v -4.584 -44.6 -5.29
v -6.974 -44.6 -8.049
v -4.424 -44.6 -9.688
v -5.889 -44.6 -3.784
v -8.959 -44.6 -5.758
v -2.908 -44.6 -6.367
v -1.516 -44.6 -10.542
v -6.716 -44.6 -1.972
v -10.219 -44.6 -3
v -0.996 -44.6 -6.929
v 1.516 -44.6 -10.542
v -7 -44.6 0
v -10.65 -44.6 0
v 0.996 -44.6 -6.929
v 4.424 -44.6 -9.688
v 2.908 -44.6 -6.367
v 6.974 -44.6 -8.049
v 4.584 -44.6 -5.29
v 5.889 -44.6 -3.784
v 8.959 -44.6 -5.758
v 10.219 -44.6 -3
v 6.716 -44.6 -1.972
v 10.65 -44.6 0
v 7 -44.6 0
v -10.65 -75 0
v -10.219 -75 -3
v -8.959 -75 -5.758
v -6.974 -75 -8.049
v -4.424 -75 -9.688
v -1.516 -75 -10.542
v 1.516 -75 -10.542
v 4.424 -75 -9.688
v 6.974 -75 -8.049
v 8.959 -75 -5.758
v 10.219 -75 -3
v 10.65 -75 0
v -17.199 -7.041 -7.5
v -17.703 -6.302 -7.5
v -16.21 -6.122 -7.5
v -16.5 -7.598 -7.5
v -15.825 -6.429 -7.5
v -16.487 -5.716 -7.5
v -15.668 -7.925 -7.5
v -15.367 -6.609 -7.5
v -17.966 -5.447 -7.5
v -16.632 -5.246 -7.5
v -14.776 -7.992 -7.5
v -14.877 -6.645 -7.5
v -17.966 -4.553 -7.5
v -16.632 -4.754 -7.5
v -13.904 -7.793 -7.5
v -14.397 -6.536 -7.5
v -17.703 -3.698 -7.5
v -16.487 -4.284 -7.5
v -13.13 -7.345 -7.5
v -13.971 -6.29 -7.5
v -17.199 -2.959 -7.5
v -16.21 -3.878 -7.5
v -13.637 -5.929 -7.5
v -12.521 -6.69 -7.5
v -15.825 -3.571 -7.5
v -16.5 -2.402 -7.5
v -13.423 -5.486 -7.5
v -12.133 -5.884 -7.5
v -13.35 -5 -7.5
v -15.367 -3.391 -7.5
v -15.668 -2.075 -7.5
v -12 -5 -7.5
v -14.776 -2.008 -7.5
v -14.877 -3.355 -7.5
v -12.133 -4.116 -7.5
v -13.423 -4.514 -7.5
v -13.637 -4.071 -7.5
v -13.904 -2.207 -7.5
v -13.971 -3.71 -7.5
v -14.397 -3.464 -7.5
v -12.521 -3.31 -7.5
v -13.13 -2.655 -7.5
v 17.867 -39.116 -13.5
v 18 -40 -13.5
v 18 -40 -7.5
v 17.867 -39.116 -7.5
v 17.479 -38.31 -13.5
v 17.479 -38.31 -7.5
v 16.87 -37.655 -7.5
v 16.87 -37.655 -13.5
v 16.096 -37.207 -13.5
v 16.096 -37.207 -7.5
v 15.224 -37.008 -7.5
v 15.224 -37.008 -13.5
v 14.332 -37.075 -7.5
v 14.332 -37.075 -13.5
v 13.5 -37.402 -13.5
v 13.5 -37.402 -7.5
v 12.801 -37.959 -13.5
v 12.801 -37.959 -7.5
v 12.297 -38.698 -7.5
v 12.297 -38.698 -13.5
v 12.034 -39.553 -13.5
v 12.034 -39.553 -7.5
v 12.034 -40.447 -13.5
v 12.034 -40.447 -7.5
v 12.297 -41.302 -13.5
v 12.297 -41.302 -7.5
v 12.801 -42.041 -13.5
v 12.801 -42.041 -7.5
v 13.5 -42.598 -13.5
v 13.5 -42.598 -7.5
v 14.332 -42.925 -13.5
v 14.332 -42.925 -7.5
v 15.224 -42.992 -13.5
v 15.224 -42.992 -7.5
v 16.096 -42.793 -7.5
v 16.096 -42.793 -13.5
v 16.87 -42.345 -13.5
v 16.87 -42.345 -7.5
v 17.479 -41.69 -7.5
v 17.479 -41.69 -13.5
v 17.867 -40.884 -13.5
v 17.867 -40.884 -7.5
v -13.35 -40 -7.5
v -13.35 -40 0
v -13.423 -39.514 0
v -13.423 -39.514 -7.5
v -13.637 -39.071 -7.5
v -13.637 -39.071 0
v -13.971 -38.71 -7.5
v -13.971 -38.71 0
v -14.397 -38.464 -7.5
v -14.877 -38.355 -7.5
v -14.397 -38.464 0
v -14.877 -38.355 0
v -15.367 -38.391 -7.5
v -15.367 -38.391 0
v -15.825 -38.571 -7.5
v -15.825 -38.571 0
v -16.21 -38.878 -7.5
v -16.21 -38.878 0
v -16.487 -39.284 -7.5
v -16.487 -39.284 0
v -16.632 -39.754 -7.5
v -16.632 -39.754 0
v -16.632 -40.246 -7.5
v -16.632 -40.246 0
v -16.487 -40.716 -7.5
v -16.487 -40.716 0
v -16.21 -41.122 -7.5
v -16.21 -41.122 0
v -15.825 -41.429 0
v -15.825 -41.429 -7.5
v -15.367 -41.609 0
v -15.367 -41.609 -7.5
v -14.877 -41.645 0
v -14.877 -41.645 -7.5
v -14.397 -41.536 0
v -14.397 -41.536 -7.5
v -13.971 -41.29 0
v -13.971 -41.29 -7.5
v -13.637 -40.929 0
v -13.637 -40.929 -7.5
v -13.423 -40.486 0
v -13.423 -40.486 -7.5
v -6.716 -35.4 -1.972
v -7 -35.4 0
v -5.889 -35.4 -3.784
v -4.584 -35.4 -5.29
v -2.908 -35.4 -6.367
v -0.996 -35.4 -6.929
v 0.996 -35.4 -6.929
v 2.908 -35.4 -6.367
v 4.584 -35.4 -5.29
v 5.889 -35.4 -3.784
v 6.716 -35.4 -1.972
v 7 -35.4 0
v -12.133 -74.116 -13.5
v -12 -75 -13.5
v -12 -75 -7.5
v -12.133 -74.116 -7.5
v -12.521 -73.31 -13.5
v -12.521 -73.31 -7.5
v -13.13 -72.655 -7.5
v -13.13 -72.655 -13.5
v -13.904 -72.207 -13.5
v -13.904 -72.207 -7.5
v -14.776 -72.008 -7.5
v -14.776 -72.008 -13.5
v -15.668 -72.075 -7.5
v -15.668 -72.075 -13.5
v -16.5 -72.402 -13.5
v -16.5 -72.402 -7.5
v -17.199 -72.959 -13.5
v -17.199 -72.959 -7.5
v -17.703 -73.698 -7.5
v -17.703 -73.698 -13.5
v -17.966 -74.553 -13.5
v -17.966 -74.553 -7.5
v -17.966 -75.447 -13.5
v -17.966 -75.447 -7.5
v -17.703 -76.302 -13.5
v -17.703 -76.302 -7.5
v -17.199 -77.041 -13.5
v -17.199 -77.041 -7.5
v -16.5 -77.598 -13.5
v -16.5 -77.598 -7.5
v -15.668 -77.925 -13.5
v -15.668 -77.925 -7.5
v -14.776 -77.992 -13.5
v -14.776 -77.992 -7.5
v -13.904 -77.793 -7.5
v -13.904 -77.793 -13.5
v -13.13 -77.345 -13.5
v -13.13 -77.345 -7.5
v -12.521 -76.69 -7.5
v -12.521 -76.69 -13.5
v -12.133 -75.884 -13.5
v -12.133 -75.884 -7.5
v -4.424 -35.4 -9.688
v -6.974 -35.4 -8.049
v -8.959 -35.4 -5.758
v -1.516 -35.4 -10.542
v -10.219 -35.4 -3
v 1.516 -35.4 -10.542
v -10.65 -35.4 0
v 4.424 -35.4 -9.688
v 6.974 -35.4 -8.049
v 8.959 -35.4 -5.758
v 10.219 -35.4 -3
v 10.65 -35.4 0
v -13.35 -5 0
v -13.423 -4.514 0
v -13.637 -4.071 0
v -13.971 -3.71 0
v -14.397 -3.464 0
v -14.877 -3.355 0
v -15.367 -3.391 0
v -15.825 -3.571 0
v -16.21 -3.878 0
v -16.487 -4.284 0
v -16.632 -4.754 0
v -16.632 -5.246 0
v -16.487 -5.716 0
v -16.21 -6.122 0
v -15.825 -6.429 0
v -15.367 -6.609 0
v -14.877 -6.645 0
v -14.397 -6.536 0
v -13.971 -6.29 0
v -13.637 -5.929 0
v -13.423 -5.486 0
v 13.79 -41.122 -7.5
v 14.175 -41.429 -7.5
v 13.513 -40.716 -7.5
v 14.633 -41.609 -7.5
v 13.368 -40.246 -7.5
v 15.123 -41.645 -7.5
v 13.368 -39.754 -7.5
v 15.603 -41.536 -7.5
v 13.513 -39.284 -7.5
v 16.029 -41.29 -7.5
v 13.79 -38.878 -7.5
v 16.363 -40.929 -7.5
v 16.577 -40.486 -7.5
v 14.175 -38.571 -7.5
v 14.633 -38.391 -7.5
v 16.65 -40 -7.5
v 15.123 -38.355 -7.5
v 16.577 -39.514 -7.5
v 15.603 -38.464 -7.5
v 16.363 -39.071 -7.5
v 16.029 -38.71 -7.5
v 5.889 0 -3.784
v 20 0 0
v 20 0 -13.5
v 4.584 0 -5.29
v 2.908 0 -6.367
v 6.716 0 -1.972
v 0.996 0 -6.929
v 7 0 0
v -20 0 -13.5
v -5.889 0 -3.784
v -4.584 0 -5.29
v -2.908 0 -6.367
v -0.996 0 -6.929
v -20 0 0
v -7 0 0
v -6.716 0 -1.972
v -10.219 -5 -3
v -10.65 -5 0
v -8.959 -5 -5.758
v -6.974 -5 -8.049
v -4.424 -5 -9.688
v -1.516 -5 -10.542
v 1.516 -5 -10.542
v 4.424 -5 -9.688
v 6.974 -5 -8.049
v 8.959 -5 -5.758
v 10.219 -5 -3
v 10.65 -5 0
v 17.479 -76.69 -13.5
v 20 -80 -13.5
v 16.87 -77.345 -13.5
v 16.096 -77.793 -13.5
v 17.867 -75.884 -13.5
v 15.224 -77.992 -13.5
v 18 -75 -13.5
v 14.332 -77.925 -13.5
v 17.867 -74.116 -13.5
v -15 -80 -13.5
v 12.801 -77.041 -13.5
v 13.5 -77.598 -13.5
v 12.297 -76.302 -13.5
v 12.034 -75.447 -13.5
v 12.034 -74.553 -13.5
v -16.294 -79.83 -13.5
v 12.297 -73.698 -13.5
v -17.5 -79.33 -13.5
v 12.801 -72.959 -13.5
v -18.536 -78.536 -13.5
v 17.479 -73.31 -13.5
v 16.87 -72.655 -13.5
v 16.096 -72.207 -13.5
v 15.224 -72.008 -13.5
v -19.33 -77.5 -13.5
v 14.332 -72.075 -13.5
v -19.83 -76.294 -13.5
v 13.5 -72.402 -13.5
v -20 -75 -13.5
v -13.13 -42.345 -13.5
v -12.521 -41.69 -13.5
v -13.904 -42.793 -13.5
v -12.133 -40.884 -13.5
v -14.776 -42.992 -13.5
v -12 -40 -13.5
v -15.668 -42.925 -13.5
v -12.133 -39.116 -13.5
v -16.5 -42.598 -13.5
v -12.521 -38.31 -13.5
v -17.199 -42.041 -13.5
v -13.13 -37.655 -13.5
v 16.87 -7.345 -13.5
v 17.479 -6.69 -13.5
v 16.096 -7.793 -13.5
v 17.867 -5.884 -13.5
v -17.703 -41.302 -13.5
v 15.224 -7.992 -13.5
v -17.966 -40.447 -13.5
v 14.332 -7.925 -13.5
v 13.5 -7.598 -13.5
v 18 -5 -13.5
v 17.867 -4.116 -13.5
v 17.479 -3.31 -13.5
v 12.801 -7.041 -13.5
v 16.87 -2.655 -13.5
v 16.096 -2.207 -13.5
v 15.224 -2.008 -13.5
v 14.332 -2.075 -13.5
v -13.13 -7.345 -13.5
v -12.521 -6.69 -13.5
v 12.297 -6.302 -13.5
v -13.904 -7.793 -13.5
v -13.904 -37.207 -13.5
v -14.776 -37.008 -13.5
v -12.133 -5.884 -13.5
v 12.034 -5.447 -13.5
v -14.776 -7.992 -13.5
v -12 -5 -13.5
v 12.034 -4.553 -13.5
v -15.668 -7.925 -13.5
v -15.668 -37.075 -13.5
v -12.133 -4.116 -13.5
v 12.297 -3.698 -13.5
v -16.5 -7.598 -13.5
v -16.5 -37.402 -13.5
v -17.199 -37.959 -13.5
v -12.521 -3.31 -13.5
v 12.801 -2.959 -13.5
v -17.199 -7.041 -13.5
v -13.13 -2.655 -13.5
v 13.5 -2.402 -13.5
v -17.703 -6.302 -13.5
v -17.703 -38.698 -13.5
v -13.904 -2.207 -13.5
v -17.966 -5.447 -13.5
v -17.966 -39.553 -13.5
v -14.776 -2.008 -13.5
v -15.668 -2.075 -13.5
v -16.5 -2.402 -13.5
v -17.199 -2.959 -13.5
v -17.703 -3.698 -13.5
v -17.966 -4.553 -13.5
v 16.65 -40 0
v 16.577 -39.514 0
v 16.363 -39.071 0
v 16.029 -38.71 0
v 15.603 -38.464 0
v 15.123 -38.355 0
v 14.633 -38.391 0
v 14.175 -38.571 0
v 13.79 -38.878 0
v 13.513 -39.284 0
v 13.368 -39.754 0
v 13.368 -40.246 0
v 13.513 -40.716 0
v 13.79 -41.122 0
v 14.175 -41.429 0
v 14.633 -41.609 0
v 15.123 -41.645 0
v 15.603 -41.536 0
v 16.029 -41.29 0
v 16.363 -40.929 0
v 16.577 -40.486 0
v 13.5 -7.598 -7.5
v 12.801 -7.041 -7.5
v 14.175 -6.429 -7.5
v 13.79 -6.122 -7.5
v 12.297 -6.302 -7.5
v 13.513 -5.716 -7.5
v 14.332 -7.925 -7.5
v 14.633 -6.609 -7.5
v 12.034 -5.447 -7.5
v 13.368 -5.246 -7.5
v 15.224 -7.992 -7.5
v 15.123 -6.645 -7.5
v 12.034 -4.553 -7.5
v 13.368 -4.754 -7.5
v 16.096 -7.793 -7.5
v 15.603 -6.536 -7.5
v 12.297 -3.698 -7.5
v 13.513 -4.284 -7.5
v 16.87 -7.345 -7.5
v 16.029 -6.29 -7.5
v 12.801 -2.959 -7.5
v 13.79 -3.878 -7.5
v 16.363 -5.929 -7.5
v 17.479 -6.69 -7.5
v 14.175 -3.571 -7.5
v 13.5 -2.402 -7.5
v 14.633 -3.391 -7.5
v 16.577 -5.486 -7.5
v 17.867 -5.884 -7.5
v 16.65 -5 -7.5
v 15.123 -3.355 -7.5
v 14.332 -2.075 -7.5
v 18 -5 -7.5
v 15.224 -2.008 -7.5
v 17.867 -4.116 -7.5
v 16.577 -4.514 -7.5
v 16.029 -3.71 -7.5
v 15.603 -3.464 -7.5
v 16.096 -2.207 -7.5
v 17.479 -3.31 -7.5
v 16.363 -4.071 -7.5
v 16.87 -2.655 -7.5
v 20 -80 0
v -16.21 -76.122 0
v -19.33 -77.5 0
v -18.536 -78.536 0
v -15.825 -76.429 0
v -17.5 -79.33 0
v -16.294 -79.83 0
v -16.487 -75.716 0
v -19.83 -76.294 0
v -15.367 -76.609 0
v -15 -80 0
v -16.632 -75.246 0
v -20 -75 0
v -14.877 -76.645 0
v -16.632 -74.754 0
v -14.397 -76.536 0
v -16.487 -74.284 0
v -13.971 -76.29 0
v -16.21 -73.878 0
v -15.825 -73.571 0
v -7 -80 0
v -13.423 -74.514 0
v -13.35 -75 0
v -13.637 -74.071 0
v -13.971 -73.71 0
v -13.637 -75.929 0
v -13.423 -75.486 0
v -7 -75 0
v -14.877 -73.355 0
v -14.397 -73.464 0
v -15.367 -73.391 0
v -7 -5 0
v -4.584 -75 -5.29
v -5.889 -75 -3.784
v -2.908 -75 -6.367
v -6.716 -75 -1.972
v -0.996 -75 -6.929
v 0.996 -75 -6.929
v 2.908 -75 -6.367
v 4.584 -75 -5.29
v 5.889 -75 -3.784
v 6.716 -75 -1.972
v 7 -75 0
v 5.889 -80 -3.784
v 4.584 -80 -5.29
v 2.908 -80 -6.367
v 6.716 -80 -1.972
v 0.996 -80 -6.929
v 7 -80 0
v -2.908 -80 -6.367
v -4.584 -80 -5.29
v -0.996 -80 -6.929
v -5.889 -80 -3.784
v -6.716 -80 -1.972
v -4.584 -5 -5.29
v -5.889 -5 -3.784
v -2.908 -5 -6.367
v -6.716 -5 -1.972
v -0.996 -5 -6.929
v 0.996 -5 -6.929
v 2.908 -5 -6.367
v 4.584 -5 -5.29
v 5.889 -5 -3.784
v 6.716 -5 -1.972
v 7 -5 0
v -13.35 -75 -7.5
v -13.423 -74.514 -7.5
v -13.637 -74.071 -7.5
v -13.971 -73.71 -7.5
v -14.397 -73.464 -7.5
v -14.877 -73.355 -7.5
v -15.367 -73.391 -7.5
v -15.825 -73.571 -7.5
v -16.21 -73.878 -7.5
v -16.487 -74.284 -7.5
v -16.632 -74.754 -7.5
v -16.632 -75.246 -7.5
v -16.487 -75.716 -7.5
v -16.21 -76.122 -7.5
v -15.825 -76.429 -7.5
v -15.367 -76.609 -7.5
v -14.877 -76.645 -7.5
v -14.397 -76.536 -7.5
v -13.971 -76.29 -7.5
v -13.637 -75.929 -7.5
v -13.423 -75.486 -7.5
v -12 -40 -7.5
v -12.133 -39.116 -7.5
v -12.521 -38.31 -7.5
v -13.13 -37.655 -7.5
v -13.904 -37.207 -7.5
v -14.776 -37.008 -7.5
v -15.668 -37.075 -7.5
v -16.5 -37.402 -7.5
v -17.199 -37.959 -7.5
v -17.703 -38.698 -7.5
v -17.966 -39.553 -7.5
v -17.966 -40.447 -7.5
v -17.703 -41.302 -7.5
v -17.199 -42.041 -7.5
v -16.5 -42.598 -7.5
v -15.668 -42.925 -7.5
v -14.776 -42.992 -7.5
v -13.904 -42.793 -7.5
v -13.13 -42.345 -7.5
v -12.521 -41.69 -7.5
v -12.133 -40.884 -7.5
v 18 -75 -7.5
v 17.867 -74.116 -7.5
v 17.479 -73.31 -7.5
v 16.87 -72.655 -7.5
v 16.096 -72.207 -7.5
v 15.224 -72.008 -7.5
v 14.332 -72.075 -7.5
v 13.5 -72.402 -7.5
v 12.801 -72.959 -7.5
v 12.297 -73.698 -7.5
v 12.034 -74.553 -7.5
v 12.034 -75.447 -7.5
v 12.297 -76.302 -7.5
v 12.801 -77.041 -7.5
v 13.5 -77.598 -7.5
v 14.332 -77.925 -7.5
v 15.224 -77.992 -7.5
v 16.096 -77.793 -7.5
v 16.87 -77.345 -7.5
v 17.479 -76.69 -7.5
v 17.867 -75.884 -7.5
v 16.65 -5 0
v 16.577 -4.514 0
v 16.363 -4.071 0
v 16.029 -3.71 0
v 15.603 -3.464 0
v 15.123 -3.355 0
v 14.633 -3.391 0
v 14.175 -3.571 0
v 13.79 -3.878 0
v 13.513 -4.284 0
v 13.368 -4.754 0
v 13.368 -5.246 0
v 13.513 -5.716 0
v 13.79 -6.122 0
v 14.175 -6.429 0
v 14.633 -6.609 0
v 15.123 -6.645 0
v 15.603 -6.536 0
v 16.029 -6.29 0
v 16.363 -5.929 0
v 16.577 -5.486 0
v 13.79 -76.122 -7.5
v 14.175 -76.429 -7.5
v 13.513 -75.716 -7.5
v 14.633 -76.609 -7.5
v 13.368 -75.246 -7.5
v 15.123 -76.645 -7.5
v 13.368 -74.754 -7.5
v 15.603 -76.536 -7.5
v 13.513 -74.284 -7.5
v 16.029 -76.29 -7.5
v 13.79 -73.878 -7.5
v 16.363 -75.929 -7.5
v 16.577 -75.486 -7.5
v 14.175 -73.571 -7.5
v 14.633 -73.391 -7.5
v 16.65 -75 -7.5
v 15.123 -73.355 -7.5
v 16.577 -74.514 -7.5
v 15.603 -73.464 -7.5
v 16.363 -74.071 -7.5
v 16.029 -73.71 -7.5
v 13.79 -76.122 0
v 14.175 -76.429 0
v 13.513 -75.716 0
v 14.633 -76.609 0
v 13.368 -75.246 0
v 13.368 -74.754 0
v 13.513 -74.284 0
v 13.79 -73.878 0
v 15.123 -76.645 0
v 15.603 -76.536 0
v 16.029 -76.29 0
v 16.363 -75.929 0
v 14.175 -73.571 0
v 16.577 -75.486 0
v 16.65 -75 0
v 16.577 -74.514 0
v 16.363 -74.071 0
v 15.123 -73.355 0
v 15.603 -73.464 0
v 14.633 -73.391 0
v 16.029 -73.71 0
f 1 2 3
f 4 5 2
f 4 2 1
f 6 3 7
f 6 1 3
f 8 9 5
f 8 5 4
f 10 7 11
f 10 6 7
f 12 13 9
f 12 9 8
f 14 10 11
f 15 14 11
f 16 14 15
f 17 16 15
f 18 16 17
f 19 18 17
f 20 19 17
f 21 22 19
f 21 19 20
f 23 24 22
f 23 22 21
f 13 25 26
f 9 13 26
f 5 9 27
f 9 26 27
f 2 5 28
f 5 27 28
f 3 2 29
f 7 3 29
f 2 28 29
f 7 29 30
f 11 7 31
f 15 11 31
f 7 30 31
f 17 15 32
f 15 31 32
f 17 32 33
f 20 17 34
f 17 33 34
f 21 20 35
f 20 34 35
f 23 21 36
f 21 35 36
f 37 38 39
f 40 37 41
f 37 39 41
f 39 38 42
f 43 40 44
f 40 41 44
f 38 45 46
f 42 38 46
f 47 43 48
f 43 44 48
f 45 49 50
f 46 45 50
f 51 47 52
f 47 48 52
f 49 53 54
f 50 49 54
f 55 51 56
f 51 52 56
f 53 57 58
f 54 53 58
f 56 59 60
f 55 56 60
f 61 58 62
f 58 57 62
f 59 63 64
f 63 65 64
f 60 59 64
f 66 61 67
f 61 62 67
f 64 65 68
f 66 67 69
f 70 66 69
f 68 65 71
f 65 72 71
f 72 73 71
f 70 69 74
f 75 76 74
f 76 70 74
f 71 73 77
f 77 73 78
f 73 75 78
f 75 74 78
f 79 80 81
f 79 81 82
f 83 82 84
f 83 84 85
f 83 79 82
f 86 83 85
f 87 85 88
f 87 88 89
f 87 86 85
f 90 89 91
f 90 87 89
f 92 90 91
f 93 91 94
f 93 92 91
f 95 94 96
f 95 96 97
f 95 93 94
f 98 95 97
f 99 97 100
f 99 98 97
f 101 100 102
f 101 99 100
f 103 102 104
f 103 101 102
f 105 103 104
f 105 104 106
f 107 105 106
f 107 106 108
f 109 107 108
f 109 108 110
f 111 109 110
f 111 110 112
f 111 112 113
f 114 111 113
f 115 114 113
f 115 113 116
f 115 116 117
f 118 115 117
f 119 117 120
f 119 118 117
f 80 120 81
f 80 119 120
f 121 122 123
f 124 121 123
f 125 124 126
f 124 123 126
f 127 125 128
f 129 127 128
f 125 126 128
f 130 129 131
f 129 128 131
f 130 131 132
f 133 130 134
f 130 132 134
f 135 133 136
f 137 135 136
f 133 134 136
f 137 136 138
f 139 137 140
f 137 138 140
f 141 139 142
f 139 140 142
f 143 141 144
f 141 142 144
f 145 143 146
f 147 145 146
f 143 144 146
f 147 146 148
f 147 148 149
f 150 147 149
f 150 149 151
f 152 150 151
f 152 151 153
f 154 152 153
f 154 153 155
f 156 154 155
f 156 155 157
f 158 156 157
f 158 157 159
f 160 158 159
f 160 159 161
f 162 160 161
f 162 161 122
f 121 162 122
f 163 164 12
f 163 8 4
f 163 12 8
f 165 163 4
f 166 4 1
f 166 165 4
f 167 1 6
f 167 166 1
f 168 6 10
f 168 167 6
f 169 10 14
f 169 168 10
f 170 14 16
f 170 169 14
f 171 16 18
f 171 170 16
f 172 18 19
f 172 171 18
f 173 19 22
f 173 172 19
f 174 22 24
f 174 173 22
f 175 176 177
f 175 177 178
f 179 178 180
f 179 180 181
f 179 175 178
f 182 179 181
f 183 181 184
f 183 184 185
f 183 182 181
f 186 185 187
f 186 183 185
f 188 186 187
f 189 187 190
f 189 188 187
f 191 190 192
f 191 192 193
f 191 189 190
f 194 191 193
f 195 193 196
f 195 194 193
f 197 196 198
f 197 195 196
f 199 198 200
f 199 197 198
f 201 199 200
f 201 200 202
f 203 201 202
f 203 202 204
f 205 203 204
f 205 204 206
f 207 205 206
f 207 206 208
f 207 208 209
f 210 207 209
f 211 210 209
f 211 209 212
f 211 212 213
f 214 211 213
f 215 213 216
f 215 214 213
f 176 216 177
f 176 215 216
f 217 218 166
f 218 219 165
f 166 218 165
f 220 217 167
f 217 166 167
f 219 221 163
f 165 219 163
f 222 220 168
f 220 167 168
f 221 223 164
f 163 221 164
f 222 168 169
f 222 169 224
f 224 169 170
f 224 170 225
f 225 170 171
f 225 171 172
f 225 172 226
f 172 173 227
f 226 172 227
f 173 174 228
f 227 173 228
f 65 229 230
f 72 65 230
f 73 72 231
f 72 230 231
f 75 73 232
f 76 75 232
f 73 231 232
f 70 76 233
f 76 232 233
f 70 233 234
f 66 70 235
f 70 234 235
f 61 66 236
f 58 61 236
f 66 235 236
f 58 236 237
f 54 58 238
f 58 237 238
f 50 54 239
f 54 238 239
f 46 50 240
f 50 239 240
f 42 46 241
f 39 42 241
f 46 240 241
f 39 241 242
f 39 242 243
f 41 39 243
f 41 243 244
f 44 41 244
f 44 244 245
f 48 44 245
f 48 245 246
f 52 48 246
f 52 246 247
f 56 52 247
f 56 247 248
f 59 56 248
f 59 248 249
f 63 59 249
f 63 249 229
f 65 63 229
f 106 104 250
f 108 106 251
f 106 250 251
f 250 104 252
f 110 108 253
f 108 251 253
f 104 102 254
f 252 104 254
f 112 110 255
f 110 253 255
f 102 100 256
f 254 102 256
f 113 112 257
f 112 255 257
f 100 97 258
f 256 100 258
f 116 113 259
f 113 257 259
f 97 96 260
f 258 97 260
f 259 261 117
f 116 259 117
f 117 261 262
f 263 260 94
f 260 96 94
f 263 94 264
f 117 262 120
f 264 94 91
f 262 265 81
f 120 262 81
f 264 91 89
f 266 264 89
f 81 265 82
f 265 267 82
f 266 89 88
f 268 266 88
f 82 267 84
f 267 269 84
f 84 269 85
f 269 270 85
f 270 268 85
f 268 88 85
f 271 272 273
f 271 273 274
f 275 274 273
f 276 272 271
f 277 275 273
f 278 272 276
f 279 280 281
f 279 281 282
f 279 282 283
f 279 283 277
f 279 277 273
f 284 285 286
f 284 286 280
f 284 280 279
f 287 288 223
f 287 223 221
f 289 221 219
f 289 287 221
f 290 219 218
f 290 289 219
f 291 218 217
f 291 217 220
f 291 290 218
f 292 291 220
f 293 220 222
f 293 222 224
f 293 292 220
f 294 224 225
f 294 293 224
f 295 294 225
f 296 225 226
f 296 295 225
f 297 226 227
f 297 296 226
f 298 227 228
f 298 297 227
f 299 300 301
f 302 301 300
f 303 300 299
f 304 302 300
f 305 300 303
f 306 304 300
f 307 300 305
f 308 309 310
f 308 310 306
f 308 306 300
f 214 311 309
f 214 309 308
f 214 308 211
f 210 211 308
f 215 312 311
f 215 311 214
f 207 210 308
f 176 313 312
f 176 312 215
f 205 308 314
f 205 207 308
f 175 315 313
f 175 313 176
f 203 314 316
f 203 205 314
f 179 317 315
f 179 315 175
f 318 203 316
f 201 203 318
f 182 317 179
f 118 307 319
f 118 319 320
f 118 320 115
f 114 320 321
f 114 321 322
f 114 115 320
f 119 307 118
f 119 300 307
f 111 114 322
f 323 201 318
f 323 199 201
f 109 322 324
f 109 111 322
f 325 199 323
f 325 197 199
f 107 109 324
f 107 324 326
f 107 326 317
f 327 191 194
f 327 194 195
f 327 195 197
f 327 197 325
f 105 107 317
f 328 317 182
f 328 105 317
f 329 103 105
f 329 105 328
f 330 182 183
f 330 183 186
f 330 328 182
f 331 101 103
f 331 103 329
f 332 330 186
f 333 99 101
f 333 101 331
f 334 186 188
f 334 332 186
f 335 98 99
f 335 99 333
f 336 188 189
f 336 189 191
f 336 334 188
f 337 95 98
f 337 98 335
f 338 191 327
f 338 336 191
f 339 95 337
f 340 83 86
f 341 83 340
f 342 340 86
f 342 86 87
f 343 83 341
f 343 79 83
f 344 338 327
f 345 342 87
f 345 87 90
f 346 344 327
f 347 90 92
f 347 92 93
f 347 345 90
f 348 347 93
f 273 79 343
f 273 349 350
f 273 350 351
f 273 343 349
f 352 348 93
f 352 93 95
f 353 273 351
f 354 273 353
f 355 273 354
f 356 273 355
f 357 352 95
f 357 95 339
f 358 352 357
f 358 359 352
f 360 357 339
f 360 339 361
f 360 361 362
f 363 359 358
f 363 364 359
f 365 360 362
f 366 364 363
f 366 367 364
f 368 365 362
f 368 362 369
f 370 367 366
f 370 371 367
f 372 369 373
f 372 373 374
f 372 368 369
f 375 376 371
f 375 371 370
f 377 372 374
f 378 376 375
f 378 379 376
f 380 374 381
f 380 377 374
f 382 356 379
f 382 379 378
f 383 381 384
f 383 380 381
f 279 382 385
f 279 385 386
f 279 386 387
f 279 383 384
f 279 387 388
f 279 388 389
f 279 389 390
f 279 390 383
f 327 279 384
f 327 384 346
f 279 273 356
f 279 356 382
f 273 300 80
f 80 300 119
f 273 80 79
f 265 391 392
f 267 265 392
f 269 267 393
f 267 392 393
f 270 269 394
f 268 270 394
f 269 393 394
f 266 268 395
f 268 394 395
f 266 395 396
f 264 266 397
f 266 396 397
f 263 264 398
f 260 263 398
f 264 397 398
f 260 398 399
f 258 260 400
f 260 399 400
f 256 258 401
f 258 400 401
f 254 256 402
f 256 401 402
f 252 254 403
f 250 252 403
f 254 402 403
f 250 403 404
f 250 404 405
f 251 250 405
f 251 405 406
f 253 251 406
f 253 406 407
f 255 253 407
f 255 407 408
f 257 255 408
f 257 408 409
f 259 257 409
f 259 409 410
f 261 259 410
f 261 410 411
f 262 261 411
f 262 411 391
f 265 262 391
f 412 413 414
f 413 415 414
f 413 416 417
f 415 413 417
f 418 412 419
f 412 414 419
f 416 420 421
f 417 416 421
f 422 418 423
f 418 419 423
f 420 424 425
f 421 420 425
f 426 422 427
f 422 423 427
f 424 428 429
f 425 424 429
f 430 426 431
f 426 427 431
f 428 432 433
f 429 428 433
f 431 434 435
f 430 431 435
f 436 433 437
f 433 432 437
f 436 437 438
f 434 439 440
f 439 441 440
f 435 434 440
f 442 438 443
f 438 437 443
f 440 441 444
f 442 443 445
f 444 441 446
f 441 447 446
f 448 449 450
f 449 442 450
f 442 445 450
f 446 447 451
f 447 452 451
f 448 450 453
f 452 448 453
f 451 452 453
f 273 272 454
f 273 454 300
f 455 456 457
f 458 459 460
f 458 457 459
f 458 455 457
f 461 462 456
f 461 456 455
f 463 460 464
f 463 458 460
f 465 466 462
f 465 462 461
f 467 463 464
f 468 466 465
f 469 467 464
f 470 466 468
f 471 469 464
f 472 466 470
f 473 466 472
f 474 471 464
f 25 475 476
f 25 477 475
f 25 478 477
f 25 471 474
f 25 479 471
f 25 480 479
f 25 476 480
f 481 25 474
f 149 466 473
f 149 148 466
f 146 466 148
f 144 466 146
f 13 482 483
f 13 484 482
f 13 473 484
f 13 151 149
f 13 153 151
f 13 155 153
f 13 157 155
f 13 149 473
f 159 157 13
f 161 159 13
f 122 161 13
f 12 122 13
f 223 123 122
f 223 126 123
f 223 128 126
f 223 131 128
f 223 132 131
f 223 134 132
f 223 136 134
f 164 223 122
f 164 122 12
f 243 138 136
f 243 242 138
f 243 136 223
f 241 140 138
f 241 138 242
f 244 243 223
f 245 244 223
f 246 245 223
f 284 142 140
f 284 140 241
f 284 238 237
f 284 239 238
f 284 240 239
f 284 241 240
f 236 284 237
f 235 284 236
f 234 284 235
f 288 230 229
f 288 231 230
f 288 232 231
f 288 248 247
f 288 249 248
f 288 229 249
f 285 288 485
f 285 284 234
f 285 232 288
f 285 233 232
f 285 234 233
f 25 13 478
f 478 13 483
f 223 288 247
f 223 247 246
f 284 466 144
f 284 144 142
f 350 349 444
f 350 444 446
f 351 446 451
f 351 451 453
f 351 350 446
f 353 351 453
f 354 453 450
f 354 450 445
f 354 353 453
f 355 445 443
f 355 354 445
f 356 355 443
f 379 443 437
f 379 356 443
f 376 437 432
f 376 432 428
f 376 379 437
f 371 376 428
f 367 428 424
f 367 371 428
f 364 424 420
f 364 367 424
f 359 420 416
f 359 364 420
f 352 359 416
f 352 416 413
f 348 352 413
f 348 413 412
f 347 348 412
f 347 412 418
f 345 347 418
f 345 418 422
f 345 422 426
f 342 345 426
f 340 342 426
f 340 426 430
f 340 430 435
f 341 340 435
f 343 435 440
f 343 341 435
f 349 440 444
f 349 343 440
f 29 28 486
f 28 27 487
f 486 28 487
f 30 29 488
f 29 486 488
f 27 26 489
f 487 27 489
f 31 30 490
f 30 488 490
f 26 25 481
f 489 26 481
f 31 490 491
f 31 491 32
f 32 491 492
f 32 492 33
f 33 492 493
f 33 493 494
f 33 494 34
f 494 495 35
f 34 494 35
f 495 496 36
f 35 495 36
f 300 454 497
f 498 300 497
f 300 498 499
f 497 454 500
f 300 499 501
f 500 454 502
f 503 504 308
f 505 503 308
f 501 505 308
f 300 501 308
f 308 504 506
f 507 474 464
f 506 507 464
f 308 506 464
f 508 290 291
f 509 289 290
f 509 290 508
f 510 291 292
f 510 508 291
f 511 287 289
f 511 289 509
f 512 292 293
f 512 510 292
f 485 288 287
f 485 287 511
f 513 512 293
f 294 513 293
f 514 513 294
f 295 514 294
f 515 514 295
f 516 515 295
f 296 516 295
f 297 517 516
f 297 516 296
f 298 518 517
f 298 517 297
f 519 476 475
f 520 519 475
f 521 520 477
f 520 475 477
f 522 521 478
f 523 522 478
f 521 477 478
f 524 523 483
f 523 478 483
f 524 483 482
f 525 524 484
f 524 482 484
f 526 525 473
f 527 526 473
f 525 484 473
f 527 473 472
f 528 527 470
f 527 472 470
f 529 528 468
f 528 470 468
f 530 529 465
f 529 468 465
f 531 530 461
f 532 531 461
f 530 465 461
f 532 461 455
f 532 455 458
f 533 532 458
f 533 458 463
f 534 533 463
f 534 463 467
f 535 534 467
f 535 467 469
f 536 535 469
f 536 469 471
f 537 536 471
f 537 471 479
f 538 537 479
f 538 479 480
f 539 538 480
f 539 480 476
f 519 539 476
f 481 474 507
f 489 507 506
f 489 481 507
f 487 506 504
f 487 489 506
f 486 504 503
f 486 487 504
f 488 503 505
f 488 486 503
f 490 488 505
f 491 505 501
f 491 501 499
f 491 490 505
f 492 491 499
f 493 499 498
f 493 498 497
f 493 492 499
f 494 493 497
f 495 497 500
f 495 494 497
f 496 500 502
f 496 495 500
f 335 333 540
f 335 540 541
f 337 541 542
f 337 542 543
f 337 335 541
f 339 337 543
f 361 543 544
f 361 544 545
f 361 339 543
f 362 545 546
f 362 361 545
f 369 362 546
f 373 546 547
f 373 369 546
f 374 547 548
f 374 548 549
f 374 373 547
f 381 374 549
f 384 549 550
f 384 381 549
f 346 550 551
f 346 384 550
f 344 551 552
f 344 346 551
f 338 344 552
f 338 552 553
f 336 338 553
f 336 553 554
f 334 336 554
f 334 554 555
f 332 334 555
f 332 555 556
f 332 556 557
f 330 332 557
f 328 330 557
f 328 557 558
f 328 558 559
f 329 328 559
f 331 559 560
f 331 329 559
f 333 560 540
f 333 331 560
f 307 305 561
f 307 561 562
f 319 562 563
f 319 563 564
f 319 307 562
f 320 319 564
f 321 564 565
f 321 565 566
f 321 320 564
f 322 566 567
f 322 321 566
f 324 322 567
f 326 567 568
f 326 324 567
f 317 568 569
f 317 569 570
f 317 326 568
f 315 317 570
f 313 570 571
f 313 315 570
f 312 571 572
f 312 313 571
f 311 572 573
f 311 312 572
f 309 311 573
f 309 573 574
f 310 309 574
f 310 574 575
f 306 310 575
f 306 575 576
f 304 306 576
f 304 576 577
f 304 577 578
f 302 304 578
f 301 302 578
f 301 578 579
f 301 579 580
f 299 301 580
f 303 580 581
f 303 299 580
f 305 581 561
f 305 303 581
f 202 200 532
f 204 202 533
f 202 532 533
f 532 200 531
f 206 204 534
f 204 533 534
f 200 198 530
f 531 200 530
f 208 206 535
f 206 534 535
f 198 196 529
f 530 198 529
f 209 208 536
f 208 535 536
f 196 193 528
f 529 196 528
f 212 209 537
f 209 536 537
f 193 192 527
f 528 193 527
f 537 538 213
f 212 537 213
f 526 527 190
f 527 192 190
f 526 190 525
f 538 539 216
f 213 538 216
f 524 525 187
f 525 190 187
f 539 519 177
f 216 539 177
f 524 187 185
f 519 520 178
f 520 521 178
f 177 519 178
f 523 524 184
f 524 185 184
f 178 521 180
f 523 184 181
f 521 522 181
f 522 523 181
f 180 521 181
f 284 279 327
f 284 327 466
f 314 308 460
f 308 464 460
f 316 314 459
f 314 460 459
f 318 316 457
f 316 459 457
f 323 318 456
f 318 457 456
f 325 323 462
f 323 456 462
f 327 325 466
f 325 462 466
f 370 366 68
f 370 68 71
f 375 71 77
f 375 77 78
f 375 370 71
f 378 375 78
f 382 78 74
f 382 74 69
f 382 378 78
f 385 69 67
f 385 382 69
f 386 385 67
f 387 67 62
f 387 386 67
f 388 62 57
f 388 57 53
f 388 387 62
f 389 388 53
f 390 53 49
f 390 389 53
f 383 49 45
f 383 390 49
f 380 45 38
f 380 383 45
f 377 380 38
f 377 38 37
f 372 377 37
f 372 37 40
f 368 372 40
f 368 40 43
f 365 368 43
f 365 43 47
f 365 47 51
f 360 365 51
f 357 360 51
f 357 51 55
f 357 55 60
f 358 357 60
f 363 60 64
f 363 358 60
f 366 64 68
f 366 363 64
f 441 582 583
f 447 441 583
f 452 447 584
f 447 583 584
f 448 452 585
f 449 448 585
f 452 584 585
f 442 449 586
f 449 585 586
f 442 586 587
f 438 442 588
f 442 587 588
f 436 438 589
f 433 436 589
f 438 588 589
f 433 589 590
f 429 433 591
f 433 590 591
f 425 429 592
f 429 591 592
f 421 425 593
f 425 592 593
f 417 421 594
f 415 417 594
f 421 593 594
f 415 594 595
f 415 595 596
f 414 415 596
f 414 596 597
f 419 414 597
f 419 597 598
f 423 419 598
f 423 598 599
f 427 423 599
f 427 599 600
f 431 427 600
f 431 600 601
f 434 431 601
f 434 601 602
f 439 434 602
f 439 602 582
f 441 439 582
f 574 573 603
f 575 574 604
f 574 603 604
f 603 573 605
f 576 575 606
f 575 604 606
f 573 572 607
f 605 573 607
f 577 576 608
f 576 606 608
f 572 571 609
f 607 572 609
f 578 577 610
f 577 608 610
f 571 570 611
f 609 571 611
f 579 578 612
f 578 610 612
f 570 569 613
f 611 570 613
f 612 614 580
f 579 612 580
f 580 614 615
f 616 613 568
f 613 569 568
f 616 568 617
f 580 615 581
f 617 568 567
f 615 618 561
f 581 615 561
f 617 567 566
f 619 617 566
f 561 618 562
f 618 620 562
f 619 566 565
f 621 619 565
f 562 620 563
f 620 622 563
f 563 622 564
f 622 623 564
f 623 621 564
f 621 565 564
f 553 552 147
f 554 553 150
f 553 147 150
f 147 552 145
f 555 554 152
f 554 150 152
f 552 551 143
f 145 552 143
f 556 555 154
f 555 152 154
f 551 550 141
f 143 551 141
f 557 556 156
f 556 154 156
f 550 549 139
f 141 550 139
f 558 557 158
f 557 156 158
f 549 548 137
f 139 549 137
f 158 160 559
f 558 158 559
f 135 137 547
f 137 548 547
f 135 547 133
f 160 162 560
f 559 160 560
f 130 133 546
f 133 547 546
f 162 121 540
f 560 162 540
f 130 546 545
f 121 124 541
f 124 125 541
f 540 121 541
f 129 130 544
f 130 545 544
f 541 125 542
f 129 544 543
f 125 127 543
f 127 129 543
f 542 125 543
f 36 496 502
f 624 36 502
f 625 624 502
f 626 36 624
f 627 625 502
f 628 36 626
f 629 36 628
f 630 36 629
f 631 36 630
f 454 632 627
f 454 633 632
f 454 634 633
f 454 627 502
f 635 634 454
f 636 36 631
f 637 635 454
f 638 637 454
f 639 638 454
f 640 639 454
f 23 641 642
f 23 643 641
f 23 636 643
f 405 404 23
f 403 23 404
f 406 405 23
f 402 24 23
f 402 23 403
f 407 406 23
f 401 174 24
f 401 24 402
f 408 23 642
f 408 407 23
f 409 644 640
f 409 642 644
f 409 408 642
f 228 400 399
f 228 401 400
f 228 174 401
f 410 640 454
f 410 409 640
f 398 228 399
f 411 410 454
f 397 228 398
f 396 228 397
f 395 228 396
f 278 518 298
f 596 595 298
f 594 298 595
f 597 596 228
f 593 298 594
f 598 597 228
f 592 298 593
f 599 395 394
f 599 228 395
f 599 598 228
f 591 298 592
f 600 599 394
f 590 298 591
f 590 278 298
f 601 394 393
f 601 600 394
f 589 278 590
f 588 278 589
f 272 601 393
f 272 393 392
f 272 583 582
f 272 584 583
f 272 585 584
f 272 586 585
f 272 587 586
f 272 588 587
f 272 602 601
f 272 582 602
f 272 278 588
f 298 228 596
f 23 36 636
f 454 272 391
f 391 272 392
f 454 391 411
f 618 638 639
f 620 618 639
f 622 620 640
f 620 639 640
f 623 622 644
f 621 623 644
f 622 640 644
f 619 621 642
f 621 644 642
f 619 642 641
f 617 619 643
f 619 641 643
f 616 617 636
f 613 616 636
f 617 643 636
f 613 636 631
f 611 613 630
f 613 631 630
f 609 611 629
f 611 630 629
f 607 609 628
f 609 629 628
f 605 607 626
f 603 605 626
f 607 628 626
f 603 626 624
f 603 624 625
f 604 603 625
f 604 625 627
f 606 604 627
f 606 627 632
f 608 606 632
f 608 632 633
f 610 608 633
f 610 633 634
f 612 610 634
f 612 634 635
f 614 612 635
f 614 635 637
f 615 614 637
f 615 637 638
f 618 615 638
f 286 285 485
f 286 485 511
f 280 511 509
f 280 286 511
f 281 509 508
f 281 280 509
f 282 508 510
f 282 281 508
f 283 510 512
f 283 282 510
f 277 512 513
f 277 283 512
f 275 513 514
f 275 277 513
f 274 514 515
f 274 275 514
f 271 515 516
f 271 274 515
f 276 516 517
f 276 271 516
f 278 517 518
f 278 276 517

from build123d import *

# Parameters (mm, degrees)
PAD_DEPTH       = 80
SKETCH001_R     = 1.65
POCKET_DEPTH    = 13.501
SKETCH002_R     = 3
POCKET001_DEPTH = 6
SKETCH003_R     = 10.65
POCKET002_DEPTH = 30.4
SKETCH004_R     = 10.65
POCKET003_DEPTH = 30.4
FILLET_R        = 5


with BuildPart() as part:
    # Sketch → Pad (new body)
    with BuildSketch(Plane.XZ):
        with BuildLine():
            Line((20, 0), (20, -13.5))
            Line((20, -13.5), (-20, -13.5))
            Line((-20, -13.5), (-20, 0))
            Line((-20, 0), (-7, 0))
            ThreePointArc((-7, 0), (0, -7), (7, 0))
            Line((7, 0), (20, 0))
        make_face()
    extrude(amount=PAD_DEPTH)

    # Sketch001 → Pocket (cut, through all)
    with BuildSketch(Plane.XY):
        with Locations((-15, -5)):
            Circle(SKETCH001_R)
        with Locations((-15, -40)):
            Circle(SKETCH001_R)
        with Locations((-15, -75)):
            Circle(SKETCH001_R)
        with Locations((15, -5)):
            Circle(SKETCH001_R)
        with Locations((15, -40)):
            Circle(SKETCH001_R)
        with Locations((15, -75)):
            Circle(SKETCH001_R)
    extrude(amount=-POCKET_DEPTH, mode=Mode.SUBTRACT)

    # Sketch002 (on DatumPlane) → Pocket001 (cut)
    with BuildSketch(Plane.XY.offset(-13.5)):
        with Locations((-15, -5)):
            Circle(SKETCH002_R)
        with Locations((-15, -40)):
            Circle(SKETCH002_R)
        with Locations((-15, -75)):
            Circle(SKETCH002_R)
        with Locations((15, -5)):
            Circle(SKETCH002_R)
        with Locations((15, -40)):
            Circle(SKETCH002_R)
        with Locations((15, -75)):
            Circle(SKETCH002_R)
    extrude(amount=POCKET001_DEPTH, mode=Mode.SUBTRACT)

    # Sketch003 (on DatumPlane) → Pocket002 (cut)
    with BuildSketch(Plane.XZ.offset(5)):
        Circle(SKETCH003_R)
    extrude(amount=POCKET002_DEPTH, mode=Mode.SUBTRACT)

    # Sketch004 (on DatumPlane) → Pocket003 (cut)
    with BuildSketch(Plane.XZ.offset(75)):
        Circle(SKETCH004_R)
    extrude(amount=-POCKET003_DEPTH, mode=Mode.SUBTRACT)

    # Fillet
    fillet_edges = [part.edges().sort_by_distance(p)[0] for p in [
        (-20, -80, -6.75),
    ]]
    fillet(fillet_edges, radius=FILLET_R)


solid = part.part
